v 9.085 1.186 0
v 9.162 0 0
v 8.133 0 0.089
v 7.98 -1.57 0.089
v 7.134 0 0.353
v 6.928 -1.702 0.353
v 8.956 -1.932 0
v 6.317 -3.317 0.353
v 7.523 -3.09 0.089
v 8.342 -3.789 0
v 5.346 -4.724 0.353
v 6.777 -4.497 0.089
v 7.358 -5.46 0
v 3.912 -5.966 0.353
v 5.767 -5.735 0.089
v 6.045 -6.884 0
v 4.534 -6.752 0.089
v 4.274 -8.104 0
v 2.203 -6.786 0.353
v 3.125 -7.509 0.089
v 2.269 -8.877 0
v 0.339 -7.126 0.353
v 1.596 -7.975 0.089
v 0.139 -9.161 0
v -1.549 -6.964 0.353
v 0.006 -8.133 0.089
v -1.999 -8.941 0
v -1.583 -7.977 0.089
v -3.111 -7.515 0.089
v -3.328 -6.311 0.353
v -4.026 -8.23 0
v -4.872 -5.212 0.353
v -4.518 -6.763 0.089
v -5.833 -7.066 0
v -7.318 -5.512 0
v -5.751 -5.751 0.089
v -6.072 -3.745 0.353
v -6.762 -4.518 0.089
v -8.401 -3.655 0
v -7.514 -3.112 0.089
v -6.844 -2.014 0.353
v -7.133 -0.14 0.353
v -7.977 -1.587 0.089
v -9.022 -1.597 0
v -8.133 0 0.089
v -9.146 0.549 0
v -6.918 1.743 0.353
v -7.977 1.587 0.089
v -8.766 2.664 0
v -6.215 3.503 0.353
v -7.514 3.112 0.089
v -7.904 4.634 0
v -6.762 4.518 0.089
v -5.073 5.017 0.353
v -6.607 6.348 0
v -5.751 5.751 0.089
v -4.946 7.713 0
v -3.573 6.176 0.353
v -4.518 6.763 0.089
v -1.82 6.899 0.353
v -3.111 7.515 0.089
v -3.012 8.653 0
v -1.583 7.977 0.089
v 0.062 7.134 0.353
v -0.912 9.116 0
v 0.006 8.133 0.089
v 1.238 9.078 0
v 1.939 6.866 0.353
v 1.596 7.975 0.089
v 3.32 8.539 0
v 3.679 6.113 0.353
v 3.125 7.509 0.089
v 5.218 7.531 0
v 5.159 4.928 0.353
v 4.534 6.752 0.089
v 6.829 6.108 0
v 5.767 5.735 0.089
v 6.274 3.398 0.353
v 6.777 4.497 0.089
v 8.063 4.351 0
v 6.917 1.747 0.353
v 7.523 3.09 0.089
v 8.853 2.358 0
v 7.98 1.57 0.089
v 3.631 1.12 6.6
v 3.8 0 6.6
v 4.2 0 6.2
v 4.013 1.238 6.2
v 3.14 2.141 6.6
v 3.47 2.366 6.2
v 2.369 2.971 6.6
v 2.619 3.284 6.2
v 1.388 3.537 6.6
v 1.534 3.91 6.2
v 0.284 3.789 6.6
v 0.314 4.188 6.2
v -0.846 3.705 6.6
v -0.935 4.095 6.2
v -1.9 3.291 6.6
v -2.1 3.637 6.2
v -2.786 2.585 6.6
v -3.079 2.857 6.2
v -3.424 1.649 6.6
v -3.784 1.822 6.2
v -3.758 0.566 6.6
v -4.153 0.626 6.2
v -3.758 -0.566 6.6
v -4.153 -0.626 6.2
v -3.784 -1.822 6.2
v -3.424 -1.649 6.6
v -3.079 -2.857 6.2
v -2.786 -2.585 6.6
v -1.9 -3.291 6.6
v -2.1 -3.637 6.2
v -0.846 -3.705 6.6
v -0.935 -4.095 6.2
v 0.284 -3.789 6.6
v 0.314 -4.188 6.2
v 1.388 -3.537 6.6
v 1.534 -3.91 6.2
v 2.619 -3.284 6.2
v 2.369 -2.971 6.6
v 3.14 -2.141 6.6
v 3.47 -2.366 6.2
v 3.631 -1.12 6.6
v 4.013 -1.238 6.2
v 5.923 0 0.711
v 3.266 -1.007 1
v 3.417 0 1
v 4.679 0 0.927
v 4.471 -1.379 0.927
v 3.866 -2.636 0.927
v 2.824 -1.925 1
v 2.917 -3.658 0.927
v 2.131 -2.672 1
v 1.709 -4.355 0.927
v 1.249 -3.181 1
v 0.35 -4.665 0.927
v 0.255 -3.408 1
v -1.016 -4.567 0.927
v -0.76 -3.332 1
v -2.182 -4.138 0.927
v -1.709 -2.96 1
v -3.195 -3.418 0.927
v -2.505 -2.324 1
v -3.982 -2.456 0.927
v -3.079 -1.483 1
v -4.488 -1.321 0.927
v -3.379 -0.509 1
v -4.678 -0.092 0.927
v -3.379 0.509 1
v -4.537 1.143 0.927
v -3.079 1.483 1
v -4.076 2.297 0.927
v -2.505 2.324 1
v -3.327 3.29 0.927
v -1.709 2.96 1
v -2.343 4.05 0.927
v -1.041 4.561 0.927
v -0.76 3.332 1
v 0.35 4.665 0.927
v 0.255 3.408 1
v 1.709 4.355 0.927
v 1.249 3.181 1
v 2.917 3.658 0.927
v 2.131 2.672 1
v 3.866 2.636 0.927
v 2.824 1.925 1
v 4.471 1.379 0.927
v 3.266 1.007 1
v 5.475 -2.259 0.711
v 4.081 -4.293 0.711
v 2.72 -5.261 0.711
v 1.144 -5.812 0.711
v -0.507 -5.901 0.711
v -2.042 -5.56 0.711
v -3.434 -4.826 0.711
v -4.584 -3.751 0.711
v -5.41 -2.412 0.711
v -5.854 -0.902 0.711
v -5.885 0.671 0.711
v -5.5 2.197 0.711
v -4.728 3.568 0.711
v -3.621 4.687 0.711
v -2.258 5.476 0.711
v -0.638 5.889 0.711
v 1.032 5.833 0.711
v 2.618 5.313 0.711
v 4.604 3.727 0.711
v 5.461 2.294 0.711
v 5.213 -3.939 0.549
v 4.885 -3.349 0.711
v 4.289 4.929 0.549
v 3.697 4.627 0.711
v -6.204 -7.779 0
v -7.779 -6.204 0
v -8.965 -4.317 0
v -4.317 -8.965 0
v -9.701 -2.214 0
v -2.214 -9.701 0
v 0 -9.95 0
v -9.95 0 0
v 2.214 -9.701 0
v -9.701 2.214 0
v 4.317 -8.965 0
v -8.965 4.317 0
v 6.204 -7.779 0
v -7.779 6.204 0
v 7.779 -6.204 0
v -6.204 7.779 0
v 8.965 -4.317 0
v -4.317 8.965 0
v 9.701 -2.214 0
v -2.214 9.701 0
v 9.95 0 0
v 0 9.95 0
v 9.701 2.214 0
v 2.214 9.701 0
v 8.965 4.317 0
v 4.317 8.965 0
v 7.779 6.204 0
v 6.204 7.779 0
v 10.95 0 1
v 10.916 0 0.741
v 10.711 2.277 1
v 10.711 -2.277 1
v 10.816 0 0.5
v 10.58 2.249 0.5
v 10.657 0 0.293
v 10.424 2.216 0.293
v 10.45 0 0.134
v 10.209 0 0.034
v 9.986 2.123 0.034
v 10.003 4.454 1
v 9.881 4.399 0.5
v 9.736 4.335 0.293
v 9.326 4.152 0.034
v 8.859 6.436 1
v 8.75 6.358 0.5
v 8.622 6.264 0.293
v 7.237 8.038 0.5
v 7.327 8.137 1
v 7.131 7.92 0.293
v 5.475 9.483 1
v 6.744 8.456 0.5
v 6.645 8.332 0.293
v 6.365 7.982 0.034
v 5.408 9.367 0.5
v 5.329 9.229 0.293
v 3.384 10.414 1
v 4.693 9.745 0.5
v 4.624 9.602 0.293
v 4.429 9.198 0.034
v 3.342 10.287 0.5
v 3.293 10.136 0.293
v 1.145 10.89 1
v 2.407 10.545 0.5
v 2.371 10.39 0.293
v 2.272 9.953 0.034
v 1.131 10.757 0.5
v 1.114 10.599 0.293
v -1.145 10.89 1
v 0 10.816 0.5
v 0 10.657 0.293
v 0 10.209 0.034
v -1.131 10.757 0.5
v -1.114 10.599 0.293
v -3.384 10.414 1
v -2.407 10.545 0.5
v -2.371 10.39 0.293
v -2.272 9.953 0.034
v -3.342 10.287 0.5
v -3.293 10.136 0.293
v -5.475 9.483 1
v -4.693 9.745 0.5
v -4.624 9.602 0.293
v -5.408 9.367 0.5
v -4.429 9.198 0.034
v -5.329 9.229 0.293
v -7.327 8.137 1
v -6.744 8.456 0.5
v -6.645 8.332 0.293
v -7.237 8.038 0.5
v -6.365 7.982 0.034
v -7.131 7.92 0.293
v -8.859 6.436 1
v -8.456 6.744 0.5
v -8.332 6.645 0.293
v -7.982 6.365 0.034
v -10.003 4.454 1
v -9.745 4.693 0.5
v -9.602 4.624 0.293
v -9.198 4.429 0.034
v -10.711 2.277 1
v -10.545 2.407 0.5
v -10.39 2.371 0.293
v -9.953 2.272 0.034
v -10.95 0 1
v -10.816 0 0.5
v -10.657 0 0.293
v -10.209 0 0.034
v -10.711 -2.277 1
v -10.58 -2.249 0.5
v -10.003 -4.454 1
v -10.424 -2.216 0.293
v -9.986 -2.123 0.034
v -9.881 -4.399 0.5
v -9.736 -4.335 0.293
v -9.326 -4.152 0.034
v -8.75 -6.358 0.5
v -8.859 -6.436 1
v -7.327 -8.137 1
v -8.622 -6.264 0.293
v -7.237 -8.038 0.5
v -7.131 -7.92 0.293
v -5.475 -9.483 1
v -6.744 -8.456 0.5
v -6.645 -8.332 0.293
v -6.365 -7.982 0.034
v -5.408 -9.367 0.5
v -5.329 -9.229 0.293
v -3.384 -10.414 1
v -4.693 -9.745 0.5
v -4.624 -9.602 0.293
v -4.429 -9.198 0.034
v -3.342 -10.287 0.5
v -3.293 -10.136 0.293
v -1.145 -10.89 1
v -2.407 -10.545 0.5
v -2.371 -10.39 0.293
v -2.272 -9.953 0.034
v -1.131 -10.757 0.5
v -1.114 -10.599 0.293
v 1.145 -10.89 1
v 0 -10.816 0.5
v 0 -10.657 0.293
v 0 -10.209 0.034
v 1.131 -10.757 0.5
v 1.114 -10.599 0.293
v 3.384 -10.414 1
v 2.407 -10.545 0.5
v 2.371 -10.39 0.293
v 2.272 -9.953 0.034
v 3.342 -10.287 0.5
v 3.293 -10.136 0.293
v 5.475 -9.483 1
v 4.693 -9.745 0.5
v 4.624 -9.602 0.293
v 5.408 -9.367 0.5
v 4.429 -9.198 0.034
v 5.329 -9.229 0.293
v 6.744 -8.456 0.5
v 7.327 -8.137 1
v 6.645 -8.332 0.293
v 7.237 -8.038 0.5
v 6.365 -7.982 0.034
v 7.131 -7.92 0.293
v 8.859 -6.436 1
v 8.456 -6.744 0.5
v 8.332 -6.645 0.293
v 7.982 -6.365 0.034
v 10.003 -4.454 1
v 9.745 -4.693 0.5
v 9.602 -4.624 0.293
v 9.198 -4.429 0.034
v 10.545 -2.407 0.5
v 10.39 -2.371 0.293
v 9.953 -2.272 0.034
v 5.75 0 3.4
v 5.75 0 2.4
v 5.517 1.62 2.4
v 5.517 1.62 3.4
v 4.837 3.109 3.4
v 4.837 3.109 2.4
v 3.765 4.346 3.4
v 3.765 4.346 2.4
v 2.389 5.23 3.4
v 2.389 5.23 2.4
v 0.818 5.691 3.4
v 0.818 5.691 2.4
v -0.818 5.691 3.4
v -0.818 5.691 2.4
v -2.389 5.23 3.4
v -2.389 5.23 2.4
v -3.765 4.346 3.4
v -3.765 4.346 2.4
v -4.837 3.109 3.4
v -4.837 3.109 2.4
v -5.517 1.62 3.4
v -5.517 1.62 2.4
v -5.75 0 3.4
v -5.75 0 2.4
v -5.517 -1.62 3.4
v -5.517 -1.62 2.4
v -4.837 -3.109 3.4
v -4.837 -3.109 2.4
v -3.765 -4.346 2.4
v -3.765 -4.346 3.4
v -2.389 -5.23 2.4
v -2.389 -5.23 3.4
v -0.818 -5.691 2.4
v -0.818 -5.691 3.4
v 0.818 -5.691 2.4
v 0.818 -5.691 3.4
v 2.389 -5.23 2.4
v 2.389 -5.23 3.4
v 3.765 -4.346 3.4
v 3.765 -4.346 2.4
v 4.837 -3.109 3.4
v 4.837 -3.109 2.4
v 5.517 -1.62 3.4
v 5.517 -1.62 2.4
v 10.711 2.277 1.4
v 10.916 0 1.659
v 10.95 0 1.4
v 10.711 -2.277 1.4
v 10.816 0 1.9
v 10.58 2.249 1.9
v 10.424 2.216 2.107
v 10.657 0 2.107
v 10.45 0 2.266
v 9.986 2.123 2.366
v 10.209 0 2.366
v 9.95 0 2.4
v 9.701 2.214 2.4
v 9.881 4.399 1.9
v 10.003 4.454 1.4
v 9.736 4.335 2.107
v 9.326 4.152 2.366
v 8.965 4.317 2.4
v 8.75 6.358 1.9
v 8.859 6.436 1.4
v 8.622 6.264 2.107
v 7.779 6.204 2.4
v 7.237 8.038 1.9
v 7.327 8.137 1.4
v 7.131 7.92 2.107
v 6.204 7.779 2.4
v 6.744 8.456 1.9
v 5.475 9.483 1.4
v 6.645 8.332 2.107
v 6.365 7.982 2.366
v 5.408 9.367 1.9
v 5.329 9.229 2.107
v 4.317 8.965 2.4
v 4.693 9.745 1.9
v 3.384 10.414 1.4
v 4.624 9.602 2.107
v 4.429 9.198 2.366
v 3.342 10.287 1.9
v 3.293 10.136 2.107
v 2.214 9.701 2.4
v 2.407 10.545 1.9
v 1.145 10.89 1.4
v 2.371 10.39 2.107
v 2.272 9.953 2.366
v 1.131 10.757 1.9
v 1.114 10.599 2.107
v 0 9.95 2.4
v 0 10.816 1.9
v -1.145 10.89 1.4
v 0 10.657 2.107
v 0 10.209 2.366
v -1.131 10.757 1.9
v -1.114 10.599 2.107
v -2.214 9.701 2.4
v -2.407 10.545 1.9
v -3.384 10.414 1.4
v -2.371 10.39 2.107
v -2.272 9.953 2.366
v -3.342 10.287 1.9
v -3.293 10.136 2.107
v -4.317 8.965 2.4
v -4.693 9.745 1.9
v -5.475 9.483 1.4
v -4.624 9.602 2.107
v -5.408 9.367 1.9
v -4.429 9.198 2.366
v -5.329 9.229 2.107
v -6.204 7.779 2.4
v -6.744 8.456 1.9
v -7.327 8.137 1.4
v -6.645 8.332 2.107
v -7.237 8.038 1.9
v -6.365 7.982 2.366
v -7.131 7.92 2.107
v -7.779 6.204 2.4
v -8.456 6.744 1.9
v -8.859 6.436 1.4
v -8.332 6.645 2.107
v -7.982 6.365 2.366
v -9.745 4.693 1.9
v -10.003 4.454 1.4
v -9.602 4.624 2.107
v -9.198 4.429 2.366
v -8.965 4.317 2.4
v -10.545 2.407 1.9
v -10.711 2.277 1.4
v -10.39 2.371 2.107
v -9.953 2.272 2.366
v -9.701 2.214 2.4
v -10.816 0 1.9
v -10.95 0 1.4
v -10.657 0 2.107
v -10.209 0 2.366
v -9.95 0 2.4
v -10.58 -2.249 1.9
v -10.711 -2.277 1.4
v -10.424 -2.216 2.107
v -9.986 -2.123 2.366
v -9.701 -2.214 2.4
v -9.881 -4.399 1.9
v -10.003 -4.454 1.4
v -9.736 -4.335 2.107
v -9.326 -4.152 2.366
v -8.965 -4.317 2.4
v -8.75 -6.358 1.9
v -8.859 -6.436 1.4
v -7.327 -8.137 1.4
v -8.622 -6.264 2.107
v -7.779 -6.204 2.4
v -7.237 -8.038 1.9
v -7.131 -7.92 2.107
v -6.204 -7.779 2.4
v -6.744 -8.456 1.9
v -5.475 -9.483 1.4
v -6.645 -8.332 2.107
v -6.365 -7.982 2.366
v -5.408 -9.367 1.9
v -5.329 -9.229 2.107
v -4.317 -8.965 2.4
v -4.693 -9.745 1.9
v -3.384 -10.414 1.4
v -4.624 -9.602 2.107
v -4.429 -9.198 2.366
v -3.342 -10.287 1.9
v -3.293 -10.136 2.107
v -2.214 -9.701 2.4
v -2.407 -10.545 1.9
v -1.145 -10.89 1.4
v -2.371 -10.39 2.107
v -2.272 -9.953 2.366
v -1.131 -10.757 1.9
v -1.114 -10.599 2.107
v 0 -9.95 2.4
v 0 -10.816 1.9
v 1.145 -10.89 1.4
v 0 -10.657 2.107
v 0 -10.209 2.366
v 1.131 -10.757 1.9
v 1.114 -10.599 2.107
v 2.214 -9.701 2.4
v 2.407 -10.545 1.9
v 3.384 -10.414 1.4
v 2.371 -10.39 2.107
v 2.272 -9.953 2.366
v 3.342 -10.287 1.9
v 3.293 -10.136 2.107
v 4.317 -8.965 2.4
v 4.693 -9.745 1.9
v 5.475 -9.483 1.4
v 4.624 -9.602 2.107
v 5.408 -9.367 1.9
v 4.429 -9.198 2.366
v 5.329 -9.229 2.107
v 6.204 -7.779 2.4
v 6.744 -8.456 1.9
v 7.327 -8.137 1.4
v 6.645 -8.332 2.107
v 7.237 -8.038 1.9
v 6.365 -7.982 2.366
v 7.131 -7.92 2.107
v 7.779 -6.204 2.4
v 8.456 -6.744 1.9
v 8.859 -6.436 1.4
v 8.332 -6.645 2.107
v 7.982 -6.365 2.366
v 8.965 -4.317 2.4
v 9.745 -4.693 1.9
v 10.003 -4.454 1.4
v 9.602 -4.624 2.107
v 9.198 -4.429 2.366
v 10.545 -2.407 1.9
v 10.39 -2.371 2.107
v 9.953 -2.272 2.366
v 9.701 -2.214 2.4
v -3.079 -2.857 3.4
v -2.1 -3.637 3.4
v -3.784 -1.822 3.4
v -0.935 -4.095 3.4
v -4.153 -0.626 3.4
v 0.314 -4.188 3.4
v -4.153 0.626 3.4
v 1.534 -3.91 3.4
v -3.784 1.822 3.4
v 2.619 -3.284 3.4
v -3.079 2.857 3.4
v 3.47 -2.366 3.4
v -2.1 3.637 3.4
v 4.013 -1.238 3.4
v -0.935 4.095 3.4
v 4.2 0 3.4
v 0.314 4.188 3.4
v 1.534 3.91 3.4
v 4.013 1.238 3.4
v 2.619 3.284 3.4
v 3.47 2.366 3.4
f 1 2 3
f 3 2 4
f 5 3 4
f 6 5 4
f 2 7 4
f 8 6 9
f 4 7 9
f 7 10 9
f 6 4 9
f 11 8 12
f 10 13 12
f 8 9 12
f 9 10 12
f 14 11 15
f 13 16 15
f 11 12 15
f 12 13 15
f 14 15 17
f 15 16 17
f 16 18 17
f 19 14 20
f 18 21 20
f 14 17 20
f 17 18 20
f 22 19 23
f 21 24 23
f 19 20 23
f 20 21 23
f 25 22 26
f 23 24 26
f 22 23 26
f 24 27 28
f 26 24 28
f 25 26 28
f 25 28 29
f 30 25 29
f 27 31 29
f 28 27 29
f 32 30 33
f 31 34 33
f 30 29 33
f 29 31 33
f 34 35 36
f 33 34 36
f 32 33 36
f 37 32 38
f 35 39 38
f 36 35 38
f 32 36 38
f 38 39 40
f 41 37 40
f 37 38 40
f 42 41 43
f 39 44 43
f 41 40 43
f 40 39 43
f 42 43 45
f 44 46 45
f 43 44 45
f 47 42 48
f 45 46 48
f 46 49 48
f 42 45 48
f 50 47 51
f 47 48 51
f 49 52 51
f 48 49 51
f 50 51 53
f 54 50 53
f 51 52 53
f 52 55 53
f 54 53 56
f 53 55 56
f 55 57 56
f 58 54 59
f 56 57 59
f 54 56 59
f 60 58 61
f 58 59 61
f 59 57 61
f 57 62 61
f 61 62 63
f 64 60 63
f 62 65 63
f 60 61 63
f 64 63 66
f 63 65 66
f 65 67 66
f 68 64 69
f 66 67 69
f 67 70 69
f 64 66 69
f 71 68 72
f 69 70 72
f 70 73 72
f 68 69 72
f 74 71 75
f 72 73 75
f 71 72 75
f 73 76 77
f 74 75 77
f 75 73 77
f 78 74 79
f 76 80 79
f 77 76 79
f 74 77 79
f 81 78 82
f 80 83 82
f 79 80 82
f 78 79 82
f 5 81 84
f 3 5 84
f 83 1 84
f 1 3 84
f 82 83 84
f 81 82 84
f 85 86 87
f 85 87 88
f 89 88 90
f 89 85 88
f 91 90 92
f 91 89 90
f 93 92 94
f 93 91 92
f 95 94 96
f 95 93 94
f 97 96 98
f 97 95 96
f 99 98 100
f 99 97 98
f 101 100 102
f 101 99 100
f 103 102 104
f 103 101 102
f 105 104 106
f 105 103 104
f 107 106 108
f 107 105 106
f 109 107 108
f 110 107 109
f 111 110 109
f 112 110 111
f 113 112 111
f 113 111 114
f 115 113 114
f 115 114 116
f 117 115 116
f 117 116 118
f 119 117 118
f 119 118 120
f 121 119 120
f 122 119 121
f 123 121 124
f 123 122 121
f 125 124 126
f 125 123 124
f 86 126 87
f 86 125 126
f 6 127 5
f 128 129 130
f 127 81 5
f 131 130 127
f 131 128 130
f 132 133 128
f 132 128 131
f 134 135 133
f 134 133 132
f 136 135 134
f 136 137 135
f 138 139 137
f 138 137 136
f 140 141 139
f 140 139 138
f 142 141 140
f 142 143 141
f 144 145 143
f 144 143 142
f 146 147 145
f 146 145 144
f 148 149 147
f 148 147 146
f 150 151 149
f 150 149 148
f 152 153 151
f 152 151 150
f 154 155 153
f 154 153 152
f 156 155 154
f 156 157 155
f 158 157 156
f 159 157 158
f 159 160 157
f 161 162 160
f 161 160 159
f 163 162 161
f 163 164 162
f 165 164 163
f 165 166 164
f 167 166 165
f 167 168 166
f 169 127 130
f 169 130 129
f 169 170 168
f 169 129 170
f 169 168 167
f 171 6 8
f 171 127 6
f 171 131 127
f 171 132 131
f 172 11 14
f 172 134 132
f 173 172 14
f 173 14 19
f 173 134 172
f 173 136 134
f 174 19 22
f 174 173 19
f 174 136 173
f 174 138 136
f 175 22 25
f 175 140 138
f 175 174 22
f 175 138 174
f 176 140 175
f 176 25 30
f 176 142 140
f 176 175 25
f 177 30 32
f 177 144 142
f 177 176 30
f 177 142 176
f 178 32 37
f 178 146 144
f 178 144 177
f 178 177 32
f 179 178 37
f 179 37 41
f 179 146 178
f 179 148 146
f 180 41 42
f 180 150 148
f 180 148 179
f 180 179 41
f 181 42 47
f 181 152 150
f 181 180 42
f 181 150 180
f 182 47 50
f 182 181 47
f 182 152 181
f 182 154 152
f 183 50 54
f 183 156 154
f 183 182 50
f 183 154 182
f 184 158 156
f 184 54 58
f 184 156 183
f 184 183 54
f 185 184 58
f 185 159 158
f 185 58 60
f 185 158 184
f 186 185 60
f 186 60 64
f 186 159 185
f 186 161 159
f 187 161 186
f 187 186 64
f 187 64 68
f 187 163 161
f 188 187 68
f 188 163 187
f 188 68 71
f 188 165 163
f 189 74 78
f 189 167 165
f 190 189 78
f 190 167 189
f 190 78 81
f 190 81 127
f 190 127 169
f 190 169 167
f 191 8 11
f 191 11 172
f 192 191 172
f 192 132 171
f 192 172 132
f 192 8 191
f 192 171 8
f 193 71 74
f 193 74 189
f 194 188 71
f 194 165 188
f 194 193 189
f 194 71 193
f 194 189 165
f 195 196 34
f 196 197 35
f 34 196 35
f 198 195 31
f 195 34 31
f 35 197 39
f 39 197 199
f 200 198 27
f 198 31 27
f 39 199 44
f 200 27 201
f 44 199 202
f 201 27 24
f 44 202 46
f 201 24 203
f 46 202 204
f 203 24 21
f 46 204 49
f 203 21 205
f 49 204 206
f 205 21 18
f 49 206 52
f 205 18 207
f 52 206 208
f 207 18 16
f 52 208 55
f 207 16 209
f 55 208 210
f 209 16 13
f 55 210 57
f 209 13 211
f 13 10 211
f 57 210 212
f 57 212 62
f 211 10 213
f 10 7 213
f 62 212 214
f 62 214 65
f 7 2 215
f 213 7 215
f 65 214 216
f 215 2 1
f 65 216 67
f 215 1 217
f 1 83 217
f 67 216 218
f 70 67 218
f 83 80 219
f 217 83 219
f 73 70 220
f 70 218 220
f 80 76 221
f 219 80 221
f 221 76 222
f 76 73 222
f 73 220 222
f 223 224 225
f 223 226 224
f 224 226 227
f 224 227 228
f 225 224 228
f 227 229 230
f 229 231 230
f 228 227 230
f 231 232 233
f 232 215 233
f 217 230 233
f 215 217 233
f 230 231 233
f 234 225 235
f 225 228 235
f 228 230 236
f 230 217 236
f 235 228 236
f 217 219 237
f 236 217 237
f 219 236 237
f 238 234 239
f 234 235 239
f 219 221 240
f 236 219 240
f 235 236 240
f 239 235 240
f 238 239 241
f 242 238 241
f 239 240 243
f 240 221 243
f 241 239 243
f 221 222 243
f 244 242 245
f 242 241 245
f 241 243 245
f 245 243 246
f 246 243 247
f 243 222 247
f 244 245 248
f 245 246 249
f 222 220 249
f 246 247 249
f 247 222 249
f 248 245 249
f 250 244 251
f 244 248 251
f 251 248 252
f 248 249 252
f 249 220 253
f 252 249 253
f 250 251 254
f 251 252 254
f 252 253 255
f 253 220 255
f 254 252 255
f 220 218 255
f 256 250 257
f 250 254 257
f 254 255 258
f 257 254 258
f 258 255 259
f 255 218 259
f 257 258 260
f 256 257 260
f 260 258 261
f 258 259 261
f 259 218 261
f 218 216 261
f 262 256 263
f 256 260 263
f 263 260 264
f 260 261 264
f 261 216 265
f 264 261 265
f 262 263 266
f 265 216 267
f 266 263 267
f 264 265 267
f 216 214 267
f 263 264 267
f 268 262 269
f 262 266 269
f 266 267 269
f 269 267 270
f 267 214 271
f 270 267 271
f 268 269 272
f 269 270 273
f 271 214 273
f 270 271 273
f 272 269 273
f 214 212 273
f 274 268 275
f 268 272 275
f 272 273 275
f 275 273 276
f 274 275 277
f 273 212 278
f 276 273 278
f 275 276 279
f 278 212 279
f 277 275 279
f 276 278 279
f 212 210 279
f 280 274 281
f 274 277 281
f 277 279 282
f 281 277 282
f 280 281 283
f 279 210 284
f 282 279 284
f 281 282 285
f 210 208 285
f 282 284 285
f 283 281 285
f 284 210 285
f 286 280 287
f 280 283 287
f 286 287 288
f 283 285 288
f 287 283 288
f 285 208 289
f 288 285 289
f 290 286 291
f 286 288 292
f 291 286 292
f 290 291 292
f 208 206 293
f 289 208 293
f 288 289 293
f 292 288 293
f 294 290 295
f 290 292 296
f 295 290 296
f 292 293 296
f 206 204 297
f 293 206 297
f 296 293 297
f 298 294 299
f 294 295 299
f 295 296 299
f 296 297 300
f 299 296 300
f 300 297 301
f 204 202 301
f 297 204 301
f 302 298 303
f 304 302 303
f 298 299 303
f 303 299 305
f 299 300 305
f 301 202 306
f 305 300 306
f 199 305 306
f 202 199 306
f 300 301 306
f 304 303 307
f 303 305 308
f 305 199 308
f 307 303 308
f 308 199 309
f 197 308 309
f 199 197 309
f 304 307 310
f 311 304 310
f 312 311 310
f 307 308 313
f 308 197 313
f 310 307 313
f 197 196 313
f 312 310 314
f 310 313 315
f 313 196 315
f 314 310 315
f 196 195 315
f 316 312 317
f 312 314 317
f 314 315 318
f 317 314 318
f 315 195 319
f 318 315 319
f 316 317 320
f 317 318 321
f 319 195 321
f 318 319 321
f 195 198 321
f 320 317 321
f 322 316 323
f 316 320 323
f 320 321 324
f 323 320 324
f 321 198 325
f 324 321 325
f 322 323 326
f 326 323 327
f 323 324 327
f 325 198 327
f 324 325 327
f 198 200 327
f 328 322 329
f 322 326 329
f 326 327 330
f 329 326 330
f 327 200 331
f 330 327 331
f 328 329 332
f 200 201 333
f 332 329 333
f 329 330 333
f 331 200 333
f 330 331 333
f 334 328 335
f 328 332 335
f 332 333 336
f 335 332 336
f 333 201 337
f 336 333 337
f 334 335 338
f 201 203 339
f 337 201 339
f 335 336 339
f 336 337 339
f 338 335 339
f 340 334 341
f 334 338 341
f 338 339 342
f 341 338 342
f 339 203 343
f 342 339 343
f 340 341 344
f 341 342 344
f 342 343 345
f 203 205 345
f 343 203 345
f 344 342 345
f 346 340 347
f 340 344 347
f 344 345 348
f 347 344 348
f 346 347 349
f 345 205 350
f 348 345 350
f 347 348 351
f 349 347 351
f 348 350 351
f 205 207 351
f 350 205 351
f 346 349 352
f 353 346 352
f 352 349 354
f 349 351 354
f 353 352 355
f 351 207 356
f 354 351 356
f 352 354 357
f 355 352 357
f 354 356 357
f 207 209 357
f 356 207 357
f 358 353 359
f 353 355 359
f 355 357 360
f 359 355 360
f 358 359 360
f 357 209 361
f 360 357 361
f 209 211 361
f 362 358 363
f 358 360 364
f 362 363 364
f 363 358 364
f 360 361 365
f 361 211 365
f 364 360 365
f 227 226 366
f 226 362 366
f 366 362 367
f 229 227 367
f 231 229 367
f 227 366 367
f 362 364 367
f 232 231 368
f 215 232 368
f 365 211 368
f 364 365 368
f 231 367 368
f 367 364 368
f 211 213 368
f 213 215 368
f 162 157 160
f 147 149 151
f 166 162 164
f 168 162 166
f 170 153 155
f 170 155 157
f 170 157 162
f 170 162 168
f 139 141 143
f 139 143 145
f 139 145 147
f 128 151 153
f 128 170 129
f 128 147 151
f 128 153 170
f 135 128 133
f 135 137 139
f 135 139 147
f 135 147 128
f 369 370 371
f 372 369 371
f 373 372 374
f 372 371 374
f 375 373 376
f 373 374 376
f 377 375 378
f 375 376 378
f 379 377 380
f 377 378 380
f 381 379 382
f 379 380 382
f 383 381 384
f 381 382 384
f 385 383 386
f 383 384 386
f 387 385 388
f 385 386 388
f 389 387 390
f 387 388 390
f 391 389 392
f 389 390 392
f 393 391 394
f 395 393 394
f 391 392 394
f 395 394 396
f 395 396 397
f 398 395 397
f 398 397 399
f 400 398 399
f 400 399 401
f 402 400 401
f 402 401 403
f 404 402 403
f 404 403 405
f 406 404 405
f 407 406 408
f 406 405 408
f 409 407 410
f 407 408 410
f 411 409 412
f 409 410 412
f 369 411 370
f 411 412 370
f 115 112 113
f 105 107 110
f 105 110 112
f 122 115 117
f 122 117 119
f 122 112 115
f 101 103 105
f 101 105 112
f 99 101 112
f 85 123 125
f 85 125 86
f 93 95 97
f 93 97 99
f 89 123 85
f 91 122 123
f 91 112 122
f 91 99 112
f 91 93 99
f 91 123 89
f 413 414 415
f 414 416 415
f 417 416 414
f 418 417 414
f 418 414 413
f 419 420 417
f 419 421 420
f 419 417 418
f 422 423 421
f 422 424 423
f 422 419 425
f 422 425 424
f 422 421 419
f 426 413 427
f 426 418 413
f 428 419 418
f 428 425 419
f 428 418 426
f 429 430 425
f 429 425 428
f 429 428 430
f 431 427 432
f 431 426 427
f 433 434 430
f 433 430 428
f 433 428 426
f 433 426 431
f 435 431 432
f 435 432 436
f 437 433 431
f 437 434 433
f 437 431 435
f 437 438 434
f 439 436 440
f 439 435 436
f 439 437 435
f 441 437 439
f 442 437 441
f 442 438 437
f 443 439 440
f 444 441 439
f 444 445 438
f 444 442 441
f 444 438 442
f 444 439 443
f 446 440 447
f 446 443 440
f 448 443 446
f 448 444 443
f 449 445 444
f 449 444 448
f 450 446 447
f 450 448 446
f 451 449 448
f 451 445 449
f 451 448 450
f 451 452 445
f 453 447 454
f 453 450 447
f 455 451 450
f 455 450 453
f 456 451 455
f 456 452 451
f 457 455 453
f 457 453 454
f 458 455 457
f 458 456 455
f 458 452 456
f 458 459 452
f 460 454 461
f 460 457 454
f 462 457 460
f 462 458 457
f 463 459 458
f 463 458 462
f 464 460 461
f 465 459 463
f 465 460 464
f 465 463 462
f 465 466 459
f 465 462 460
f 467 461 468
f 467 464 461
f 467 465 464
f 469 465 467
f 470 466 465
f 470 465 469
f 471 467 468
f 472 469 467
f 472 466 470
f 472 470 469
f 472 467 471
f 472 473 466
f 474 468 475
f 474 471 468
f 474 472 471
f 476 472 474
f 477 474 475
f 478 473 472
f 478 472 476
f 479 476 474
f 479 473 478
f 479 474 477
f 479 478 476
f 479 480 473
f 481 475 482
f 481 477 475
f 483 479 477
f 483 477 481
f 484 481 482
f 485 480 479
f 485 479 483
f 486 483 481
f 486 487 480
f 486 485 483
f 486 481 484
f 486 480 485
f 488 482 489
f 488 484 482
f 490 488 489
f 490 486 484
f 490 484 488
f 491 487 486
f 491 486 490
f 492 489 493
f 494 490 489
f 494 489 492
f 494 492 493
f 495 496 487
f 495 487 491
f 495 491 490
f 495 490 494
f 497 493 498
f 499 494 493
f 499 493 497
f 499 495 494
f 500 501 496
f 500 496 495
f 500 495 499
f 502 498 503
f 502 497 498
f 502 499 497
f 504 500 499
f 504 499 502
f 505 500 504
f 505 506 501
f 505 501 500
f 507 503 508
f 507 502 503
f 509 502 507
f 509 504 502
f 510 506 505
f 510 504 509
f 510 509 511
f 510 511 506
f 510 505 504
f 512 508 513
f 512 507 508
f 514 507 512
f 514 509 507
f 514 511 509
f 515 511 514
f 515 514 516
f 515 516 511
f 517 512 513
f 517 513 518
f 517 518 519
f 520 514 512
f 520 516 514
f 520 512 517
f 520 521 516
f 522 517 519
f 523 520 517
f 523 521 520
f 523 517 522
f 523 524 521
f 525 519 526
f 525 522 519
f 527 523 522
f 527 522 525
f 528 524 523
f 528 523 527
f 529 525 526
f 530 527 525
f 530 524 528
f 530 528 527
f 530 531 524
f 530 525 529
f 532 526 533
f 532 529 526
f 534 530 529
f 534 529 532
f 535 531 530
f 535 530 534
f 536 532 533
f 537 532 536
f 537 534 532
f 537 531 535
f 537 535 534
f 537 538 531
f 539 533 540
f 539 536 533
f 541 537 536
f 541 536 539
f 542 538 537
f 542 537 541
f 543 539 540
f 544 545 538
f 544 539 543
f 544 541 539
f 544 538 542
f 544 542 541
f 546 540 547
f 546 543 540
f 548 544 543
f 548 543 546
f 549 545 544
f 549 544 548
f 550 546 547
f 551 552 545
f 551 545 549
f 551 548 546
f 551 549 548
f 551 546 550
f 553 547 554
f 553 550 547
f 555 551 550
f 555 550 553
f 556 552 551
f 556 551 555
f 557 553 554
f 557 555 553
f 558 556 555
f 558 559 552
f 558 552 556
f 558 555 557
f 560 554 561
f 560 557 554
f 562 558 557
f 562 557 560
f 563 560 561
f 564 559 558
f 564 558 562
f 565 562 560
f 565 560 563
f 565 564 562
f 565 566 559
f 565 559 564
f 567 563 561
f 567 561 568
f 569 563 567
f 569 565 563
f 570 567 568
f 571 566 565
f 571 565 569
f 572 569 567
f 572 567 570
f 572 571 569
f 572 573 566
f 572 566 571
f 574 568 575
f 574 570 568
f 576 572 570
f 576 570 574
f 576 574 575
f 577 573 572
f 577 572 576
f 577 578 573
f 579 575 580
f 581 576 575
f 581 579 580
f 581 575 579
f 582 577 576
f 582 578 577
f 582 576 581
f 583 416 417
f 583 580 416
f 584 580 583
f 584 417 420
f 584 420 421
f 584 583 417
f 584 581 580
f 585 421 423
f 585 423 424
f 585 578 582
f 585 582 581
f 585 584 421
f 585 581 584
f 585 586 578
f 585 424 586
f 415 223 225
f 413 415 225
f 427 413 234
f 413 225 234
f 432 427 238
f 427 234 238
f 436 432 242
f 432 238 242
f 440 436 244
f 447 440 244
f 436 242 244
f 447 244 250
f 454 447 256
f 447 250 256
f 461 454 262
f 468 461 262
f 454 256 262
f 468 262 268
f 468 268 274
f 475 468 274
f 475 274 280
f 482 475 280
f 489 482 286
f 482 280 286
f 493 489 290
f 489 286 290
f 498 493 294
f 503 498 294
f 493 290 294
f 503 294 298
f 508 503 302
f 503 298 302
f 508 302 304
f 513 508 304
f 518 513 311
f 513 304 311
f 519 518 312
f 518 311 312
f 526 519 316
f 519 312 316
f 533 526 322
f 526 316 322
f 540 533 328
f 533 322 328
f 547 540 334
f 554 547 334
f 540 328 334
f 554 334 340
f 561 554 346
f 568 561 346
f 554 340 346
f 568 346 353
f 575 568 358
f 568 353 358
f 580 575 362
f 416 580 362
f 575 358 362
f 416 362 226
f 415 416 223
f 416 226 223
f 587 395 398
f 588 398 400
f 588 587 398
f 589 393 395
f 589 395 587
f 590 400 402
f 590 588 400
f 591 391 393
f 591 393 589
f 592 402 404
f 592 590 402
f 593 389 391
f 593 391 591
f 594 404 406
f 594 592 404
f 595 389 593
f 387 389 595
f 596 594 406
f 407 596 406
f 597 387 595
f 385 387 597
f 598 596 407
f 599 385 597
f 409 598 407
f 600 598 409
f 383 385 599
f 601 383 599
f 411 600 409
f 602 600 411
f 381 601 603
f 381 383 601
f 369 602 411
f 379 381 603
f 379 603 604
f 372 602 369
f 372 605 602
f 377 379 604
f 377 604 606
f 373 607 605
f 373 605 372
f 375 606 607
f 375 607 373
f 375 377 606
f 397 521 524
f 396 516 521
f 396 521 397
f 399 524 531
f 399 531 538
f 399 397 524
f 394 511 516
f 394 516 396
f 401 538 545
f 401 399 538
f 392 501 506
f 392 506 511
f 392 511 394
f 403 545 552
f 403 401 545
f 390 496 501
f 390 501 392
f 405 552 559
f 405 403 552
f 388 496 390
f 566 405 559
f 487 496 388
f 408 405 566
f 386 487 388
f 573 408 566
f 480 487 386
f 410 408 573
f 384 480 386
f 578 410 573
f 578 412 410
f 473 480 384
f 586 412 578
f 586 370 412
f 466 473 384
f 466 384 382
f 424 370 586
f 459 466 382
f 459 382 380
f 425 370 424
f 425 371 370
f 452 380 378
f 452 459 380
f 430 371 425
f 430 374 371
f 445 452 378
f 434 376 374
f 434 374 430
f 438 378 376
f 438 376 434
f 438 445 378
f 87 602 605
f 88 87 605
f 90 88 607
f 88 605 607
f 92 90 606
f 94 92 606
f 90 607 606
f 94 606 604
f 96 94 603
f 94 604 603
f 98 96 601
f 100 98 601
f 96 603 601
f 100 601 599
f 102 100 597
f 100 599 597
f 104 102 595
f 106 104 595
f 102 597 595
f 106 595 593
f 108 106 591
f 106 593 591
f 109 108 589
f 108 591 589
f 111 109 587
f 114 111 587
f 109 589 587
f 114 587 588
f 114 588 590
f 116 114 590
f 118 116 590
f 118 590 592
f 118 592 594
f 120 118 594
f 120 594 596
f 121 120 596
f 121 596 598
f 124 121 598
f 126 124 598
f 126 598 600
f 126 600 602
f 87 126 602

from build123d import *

# Parameters (mm, degrees)
F0_R     = 10.95
F1_DEPTH = 2.4
F2_R     = 4.2
F3_DEPTH = 4.2
F4_R     = 1
F5_R     = 5.75
F5_R_2   = 4.2
F6_DEPTH = 1
F7_R     = 1
F8_R     = 8
F9_DEPTH = 1
F11_SIZE = 0.4
F12_R    = 6


# Not quite as in the source:
# - a fillet or chamfer that OpenCascade refuses, or shapes differently, is made with other operations: its cross-section is extruded or revolved along the edge and cut away or added


with BuildPart() as f1:
    # F0 (on Top) → F1 (new body)
    with BuildSketch(Plane.XY):
        Circle(F0_R)
    extrude(amount=F1_DEPTH)

    # F2 (on face) → F3 (join)
    with BuildSketch(Plane.XY.offset(2.4)):
        Circle(F2_R)
    extrude(amount=F3_DEPTH)

    # F4
    f4_edges = [f1.edges().sort_by_distance(p)[0] for p in [
        (-10.95, 0, 2.4),
    ]]
    fillet(f4_edges, radius=F4_R)

    # F5 (on face) → F6 (join)
    with BuildSketch(Plane.XY.offset(2.4)):
        Circle(F5_R)
        Circle(F5_R_2, mode=Mode.SUBTRACT)
    extrude(amount=F6_DEPTH)

    # F7
    f7_edges = [f1.edges().sort_by_distance(p)[0] for p in [
        (-10.95, 0, 0),
    ]]
    fillet(f7_edges, radius=F7_R)

    # F8 (on face) → F9 (cut)
    with BuildSketch(Plane(origin=(0, 0, 0), x_dir=(1, 0, 0), z_dir=(0, 0, -1))):
        Circle(F8_R)
    extrude(amount=-F9_DEPTH, mode=Mode.SUBTRACT)

    # F10: fillet of radius 11 on 1 edges, made by hand

    # F10_s1 → F10_t2 (revolve)
    with BuildSketch(Plane.XZ):
        with BuildLine():
            ThreePointArc((8, 0), (5.762632185, 0.7470926301), (3.417424305, 1))
            Line((3.417424305, 1), (8, 1))
            Line((8, 1), (8, 0))
        make_face()
    revolve(axis=Axis((0, 0, 1), (0, 0, -1)))

    # F11
    f11_edges = [f1.edges().sort_by_distance(p)[0] for p in [
        (-4.2, 0, 6.6),
    ]]
    chamfer(f11_edges, length=F11_SIZE)

    # F12
    f12_edges = [f1.edges().sort_by_distance(p)[0] for p in [
        (-8, 0, 0),
    ]]
    fillet(f12_edges, radius=F12_R)


solid = f1.part
